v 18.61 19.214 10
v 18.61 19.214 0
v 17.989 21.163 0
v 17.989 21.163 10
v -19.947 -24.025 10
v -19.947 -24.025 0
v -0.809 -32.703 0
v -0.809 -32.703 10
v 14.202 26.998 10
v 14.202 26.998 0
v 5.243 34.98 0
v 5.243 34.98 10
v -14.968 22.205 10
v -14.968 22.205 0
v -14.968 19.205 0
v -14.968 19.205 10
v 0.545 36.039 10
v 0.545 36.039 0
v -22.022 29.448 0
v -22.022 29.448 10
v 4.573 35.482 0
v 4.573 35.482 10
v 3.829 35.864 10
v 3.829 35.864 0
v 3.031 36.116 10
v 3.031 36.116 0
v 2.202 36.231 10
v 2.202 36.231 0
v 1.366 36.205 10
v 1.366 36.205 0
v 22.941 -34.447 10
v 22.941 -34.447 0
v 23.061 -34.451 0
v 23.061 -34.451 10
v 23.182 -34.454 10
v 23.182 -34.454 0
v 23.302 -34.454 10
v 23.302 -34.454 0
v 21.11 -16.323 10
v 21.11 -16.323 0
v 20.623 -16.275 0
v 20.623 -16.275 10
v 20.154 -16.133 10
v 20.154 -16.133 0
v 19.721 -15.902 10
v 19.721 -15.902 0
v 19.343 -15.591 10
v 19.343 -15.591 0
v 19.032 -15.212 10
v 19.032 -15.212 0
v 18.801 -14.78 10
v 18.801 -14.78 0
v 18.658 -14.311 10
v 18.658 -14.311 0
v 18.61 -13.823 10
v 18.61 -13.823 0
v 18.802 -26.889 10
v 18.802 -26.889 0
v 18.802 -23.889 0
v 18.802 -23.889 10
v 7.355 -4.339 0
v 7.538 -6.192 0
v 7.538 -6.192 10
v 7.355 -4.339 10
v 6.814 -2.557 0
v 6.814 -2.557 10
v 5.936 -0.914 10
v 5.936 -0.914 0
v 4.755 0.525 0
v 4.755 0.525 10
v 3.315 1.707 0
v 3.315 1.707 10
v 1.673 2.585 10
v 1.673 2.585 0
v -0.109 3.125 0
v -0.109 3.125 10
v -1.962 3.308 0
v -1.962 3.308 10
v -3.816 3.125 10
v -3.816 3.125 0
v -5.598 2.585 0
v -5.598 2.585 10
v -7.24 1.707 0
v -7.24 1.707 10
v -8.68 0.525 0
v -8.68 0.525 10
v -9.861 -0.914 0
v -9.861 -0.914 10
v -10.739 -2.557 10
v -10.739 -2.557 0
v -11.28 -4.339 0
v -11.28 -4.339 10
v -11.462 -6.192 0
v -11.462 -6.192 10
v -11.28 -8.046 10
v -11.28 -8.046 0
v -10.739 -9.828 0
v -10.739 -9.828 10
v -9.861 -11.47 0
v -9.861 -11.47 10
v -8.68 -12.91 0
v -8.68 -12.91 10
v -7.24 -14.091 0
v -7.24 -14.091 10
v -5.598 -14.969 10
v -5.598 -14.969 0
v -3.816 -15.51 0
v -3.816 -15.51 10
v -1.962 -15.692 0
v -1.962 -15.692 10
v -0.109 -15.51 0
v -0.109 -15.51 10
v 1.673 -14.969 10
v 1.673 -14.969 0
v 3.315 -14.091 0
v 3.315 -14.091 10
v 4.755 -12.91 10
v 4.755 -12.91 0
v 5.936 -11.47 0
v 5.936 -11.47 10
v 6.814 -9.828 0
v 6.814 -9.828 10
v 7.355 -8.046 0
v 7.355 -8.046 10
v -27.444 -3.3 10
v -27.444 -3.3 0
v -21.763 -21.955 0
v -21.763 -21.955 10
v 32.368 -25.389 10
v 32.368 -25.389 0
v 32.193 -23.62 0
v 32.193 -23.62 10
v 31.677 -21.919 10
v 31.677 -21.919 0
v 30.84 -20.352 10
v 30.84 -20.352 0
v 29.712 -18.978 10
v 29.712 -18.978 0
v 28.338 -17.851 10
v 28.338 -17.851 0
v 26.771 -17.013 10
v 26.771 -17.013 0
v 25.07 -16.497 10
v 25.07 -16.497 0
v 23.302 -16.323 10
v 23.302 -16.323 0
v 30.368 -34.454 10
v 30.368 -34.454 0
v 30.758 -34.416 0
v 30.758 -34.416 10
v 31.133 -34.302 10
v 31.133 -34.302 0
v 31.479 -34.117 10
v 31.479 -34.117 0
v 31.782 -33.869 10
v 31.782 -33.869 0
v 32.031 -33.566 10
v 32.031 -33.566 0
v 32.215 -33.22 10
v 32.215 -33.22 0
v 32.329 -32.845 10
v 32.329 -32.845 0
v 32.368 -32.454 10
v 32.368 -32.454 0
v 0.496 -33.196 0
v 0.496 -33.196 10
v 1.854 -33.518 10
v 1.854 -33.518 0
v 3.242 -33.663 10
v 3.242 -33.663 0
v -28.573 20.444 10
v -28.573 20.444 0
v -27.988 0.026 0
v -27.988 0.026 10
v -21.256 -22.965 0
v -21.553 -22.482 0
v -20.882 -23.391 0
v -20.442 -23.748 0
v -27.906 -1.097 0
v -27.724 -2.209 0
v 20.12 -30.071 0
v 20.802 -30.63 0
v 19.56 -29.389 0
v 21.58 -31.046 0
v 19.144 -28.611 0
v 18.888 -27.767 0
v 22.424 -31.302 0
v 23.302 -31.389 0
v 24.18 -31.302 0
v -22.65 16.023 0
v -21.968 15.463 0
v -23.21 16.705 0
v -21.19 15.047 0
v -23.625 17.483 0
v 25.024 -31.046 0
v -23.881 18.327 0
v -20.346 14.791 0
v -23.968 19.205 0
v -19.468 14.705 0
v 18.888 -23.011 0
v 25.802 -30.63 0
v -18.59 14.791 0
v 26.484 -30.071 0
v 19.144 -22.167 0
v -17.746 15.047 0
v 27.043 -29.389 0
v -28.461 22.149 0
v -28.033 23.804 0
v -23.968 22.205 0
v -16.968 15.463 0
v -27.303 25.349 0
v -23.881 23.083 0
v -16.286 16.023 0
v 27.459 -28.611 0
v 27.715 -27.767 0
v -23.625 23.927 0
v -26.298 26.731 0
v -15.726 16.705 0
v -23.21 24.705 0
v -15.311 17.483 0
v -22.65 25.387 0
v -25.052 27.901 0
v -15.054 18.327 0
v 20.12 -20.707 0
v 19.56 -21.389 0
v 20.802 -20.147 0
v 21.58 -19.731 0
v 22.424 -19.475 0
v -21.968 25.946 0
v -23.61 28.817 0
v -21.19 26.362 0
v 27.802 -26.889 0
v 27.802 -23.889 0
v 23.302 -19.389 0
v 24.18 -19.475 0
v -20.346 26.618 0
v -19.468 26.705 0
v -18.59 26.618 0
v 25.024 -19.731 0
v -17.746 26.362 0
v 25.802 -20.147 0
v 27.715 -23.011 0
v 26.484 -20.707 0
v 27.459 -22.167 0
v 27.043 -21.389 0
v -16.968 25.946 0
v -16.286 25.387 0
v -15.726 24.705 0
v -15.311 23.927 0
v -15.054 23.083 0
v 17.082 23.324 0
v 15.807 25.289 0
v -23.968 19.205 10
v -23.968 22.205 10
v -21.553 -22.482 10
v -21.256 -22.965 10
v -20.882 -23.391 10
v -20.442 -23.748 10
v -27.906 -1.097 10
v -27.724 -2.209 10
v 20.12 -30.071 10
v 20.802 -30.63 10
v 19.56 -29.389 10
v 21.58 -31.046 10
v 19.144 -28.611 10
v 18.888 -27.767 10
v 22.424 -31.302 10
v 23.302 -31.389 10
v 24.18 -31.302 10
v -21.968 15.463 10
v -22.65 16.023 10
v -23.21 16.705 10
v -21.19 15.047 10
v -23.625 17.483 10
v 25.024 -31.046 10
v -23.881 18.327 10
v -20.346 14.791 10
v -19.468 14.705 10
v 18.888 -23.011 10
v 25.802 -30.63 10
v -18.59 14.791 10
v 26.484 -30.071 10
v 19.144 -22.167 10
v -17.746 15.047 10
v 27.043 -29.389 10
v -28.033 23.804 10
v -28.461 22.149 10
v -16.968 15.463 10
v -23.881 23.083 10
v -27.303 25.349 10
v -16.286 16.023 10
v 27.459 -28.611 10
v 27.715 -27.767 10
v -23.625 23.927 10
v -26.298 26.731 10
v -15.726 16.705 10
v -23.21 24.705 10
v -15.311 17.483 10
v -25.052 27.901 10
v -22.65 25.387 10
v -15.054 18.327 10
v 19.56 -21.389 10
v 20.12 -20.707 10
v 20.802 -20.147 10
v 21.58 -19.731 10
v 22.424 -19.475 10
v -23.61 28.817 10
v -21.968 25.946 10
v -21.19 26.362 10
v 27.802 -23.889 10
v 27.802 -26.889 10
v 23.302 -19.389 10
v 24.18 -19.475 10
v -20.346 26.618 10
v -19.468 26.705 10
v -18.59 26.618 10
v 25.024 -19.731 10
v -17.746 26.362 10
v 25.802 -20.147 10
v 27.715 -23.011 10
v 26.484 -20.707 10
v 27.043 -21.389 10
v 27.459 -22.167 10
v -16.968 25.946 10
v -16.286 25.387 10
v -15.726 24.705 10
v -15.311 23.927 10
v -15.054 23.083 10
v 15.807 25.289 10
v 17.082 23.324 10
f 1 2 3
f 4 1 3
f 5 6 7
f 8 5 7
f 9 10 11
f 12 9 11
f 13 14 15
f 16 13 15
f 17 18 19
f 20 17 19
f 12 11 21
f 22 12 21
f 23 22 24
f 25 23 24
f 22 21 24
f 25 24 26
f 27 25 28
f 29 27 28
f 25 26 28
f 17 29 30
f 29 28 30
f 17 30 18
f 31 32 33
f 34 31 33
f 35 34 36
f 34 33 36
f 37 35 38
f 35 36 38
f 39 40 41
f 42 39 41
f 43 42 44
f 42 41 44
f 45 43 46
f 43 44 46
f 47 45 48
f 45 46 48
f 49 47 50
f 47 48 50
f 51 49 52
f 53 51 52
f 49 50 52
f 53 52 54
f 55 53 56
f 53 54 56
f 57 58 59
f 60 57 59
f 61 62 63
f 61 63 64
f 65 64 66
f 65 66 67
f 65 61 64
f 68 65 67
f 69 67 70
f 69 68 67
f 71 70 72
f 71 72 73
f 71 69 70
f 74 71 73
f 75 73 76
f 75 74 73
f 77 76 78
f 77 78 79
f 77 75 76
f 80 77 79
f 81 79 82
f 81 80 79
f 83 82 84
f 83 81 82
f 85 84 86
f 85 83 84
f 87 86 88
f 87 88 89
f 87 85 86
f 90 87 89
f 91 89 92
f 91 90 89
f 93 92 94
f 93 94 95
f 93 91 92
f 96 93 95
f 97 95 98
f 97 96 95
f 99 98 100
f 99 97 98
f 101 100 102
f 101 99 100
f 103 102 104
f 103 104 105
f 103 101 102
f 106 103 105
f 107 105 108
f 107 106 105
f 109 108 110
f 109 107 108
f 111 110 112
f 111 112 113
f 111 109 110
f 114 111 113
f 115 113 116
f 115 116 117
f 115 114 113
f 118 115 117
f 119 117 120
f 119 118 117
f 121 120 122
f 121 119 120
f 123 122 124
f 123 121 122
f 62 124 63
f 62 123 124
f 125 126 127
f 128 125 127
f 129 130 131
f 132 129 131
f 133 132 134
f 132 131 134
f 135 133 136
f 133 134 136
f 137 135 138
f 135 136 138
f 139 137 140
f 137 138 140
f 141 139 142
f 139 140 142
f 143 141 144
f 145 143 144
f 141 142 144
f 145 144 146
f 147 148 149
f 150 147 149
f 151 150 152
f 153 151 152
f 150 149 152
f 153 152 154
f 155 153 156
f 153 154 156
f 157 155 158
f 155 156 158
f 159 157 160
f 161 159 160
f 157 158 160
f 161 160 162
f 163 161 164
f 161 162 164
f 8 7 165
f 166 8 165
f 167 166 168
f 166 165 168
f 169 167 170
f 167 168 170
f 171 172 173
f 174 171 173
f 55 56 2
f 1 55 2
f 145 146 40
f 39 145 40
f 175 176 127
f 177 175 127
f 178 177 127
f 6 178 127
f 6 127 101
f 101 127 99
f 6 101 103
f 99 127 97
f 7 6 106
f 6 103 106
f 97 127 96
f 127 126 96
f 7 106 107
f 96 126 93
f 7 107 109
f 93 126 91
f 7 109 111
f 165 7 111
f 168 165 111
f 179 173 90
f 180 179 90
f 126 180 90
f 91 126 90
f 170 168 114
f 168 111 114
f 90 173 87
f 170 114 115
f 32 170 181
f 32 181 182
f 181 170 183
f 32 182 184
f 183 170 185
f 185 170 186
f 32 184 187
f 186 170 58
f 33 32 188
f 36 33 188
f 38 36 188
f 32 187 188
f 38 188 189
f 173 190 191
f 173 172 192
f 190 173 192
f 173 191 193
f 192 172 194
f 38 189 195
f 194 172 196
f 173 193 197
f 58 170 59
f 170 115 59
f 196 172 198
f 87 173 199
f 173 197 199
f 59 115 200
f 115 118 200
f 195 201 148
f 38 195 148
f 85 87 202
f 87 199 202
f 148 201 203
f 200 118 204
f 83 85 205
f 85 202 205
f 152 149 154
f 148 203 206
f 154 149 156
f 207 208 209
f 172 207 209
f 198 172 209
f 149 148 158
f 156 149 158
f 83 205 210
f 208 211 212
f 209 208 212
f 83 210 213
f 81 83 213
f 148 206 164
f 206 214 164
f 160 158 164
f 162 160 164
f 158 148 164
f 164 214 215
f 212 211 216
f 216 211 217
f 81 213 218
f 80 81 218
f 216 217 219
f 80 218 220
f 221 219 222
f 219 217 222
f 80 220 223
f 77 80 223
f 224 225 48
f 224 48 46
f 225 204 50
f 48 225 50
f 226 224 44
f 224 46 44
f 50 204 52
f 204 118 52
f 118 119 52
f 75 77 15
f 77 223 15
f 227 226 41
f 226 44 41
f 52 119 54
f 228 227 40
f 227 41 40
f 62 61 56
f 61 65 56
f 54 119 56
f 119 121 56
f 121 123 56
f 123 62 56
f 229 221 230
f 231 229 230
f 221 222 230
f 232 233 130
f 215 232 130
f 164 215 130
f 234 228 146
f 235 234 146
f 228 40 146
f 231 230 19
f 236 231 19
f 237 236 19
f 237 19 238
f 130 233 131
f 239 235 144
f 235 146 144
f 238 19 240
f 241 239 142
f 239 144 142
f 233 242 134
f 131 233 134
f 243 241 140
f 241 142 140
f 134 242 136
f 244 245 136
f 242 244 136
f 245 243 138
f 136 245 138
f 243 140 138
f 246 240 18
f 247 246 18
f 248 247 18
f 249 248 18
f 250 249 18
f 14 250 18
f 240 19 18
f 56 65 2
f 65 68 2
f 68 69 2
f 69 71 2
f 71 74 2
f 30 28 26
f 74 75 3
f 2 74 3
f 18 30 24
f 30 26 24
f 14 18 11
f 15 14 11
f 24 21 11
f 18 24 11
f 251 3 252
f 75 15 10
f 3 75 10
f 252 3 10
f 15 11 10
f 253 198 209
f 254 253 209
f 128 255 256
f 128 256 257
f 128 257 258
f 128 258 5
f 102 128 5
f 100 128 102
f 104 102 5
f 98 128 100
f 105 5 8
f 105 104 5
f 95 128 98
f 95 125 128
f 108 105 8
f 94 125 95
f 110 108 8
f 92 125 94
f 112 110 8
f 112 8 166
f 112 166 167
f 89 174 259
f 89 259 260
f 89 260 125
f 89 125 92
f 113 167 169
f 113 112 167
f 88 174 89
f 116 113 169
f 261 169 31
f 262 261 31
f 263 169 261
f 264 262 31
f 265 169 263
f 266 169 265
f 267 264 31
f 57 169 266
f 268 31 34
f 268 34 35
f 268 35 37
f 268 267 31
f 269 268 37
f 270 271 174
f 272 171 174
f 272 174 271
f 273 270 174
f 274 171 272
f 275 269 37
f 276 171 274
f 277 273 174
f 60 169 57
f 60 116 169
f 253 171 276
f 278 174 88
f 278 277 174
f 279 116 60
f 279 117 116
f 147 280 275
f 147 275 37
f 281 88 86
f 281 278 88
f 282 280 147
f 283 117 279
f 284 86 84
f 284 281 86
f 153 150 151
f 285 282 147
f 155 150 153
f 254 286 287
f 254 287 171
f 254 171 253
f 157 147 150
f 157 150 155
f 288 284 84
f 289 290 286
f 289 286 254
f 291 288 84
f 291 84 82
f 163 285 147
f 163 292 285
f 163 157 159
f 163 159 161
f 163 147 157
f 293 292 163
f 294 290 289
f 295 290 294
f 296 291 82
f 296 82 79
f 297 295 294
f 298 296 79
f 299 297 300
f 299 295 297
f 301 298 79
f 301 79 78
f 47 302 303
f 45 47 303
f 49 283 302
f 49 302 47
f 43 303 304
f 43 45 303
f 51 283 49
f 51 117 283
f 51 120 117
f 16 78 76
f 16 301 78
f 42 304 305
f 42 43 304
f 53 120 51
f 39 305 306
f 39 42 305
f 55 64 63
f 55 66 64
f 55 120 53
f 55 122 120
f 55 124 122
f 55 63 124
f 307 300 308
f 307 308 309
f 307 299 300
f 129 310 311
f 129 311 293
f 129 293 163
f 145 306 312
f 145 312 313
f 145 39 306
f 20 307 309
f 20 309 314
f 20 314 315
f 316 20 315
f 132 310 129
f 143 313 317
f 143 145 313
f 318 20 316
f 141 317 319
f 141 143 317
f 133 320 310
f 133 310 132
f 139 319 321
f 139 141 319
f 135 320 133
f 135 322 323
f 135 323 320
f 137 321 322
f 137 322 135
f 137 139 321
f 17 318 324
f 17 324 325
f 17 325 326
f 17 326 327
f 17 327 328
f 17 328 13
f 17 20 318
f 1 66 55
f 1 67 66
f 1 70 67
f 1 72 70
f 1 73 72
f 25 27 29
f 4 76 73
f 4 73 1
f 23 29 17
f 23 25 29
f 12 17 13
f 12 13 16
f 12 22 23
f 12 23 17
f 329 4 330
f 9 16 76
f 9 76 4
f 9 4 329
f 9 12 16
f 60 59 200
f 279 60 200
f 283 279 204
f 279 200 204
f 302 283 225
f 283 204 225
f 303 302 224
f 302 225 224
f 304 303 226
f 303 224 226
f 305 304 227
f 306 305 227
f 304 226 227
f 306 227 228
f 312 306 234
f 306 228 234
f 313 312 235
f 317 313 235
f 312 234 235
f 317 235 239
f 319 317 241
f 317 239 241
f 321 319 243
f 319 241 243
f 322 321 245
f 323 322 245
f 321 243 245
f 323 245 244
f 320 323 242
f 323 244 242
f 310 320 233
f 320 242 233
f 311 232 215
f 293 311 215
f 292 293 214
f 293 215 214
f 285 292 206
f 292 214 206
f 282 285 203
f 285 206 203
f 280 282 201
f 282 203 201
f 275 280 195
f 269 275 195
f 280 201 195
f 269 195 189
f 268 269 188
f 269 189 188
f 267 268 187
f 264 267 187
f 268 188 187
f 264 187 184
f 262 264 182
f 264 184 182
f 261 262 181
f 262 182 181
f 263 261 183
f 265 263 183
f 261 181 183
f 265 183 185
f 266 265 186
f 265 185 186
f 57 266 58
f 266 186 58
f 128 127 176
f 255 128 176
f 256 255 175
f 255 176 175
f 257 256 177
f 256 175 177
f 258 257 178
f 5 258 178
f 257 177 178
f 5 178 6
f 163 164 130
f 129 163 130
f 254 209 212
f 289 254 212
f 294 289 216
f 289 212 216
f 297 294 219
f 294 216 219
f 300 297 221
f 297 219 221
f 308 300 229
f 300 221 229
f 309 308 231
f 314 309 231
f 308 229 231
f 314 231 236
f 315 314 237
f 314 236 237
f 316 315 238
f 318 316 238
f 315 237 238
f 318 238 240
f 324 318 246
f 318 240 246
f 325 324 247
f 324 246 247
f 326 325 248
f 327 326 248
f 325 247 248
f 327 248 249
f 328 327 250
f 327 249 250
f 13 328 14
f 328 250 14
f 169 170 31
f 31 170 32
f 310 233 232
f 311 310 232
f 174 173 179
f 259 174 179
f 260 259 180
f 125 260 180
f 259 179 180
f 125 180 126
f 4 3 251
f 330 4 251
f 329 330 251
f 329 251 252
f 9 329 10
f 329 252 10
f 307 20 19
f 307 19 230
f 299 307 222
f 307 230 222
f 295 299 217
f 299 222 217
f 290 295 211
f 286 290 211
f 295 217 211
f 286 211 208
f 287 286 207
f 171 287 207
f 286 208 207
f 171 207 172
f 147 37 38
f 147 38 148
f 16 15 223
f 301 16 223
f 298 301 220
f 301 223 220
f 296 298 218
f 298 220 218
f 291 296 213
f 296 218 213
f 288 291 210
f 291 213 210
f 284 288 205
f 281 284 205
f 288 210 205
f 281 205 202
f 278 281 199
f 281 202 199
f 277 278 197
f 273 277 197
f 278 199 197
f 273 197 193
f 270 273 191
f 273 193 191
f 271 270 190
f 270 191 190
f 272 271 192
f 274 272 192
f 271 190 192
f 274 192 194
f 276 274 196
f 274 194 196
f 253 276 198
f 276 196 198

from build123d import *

# Parameters (mm, degrees)
F0_R     = 9.5
F1_DEPTH = 10


with BuildPart() as f1:
    # F0 (on Top) → F1 (new body)
    with BuildSketch(Plane.XY):
        with BuildLine():
            Line((0.545393, 36.038877), (-22.02152, 29.448028))
            ThreePointArc((-22.02152, 29.448028), (-26.833244, 26.063712), (-28.572816, 20.444089))
            Line((-28.572816, 20.444089), (-27.988367, 0.026176))
            ThreePointArc((-27.988367, 0.026176), (-27.827538, -1.655225), (-27.444354, -3.300261))
            Line((-27.444354, -3.300261), (-21.763491, -21.955443))
            ThreePointArc((-21.763491, -21.955443), (-21.078383, -23.186097), (-19.947006, -24.025066))
            Line((-19.947006, -24.025066), (-0.808983, -32.702572))
            ThreePointArc((-0.808983, -32.702572), (1.170286, -33.37879), (3.242493, -33.662925))
            Line((3.242493, -33.662925), (22.94121, -34.447196))
            ThreePointArc((22.94121, -34.447196), (23.121499, -34.452579), (23.30186, -34.454373))
            Line((23.30186, -34.454373), (30.367569, -34.454373))
            ThreePointArc((30.367569, -34.454373), (31.781783, -33.868586), (32.367569, -32.454373))
            Line((32.367569, -32.454373), (32.367569, -25.388663))
            ThreePointArc((32.367569, -25.388663), (29.712285, -18.978239), (23.30186, -16.322954))
            Line((23.30186, -16.322954), (21.110382, -16.322954))
            ThreePointArc((21.110382, -16.322954), (19.342615, -15.590721), (18.610382, -13.822954))
            Line((18.610382, -13.822954), (18.610382, 19.213525))
            Line((18.610382, 19.213525), (17.989468, 21.163003))
            ThreePointArc((17.989468, 21.163003), (16.488271, 24.335084), (14.202401, 26.99788))
            Line((14.202401, 26.99788), (5.242804, 34.979598))
            ThreePointArc((5.242804, 34.979598), (3.031016, 36.116406), (0.545393, 36.038877))
        make_face()
        with Locations((-1.962485, -6.192283)):
            Circle(F0_R, mode=Mode.SUBTRACT)
        with BuildLine():
            ThreePointArc((18.80186, -23.888663), (23.30186, -19.388663), (27.80186, -23.888663))
            Line((27.80186, -23.888663), (27.80186, -26.888663))
            ThreePointArc((27.80186, -26.888663), (23.30186, -31.388663), (18.80186, -26.888663))
            Line((18.80186, -26.888663), (18.80186, -23.888663))
        make_face(mode=Mode.SUBTRACT)
        with BuildLine():
            ThreePointArc((-23.967964, 22.20471), (-19.467964, 26.70471), (-14.967964, 22.20471))
            Line((-14.967964, 22.20471), (-14.967964, 19.20471))
            ThreePointArc((-14.967964, 19.20471), (-19.467964, 14.70471), (-23.967964, 19.20471))
            Line((-23.967964, 19.20471), (-23.967964, 22.20471))
        make_face(mode=Mode.SUBTRACT)
    extrude(amount=F1_DEPTH)


solid = f1.part
